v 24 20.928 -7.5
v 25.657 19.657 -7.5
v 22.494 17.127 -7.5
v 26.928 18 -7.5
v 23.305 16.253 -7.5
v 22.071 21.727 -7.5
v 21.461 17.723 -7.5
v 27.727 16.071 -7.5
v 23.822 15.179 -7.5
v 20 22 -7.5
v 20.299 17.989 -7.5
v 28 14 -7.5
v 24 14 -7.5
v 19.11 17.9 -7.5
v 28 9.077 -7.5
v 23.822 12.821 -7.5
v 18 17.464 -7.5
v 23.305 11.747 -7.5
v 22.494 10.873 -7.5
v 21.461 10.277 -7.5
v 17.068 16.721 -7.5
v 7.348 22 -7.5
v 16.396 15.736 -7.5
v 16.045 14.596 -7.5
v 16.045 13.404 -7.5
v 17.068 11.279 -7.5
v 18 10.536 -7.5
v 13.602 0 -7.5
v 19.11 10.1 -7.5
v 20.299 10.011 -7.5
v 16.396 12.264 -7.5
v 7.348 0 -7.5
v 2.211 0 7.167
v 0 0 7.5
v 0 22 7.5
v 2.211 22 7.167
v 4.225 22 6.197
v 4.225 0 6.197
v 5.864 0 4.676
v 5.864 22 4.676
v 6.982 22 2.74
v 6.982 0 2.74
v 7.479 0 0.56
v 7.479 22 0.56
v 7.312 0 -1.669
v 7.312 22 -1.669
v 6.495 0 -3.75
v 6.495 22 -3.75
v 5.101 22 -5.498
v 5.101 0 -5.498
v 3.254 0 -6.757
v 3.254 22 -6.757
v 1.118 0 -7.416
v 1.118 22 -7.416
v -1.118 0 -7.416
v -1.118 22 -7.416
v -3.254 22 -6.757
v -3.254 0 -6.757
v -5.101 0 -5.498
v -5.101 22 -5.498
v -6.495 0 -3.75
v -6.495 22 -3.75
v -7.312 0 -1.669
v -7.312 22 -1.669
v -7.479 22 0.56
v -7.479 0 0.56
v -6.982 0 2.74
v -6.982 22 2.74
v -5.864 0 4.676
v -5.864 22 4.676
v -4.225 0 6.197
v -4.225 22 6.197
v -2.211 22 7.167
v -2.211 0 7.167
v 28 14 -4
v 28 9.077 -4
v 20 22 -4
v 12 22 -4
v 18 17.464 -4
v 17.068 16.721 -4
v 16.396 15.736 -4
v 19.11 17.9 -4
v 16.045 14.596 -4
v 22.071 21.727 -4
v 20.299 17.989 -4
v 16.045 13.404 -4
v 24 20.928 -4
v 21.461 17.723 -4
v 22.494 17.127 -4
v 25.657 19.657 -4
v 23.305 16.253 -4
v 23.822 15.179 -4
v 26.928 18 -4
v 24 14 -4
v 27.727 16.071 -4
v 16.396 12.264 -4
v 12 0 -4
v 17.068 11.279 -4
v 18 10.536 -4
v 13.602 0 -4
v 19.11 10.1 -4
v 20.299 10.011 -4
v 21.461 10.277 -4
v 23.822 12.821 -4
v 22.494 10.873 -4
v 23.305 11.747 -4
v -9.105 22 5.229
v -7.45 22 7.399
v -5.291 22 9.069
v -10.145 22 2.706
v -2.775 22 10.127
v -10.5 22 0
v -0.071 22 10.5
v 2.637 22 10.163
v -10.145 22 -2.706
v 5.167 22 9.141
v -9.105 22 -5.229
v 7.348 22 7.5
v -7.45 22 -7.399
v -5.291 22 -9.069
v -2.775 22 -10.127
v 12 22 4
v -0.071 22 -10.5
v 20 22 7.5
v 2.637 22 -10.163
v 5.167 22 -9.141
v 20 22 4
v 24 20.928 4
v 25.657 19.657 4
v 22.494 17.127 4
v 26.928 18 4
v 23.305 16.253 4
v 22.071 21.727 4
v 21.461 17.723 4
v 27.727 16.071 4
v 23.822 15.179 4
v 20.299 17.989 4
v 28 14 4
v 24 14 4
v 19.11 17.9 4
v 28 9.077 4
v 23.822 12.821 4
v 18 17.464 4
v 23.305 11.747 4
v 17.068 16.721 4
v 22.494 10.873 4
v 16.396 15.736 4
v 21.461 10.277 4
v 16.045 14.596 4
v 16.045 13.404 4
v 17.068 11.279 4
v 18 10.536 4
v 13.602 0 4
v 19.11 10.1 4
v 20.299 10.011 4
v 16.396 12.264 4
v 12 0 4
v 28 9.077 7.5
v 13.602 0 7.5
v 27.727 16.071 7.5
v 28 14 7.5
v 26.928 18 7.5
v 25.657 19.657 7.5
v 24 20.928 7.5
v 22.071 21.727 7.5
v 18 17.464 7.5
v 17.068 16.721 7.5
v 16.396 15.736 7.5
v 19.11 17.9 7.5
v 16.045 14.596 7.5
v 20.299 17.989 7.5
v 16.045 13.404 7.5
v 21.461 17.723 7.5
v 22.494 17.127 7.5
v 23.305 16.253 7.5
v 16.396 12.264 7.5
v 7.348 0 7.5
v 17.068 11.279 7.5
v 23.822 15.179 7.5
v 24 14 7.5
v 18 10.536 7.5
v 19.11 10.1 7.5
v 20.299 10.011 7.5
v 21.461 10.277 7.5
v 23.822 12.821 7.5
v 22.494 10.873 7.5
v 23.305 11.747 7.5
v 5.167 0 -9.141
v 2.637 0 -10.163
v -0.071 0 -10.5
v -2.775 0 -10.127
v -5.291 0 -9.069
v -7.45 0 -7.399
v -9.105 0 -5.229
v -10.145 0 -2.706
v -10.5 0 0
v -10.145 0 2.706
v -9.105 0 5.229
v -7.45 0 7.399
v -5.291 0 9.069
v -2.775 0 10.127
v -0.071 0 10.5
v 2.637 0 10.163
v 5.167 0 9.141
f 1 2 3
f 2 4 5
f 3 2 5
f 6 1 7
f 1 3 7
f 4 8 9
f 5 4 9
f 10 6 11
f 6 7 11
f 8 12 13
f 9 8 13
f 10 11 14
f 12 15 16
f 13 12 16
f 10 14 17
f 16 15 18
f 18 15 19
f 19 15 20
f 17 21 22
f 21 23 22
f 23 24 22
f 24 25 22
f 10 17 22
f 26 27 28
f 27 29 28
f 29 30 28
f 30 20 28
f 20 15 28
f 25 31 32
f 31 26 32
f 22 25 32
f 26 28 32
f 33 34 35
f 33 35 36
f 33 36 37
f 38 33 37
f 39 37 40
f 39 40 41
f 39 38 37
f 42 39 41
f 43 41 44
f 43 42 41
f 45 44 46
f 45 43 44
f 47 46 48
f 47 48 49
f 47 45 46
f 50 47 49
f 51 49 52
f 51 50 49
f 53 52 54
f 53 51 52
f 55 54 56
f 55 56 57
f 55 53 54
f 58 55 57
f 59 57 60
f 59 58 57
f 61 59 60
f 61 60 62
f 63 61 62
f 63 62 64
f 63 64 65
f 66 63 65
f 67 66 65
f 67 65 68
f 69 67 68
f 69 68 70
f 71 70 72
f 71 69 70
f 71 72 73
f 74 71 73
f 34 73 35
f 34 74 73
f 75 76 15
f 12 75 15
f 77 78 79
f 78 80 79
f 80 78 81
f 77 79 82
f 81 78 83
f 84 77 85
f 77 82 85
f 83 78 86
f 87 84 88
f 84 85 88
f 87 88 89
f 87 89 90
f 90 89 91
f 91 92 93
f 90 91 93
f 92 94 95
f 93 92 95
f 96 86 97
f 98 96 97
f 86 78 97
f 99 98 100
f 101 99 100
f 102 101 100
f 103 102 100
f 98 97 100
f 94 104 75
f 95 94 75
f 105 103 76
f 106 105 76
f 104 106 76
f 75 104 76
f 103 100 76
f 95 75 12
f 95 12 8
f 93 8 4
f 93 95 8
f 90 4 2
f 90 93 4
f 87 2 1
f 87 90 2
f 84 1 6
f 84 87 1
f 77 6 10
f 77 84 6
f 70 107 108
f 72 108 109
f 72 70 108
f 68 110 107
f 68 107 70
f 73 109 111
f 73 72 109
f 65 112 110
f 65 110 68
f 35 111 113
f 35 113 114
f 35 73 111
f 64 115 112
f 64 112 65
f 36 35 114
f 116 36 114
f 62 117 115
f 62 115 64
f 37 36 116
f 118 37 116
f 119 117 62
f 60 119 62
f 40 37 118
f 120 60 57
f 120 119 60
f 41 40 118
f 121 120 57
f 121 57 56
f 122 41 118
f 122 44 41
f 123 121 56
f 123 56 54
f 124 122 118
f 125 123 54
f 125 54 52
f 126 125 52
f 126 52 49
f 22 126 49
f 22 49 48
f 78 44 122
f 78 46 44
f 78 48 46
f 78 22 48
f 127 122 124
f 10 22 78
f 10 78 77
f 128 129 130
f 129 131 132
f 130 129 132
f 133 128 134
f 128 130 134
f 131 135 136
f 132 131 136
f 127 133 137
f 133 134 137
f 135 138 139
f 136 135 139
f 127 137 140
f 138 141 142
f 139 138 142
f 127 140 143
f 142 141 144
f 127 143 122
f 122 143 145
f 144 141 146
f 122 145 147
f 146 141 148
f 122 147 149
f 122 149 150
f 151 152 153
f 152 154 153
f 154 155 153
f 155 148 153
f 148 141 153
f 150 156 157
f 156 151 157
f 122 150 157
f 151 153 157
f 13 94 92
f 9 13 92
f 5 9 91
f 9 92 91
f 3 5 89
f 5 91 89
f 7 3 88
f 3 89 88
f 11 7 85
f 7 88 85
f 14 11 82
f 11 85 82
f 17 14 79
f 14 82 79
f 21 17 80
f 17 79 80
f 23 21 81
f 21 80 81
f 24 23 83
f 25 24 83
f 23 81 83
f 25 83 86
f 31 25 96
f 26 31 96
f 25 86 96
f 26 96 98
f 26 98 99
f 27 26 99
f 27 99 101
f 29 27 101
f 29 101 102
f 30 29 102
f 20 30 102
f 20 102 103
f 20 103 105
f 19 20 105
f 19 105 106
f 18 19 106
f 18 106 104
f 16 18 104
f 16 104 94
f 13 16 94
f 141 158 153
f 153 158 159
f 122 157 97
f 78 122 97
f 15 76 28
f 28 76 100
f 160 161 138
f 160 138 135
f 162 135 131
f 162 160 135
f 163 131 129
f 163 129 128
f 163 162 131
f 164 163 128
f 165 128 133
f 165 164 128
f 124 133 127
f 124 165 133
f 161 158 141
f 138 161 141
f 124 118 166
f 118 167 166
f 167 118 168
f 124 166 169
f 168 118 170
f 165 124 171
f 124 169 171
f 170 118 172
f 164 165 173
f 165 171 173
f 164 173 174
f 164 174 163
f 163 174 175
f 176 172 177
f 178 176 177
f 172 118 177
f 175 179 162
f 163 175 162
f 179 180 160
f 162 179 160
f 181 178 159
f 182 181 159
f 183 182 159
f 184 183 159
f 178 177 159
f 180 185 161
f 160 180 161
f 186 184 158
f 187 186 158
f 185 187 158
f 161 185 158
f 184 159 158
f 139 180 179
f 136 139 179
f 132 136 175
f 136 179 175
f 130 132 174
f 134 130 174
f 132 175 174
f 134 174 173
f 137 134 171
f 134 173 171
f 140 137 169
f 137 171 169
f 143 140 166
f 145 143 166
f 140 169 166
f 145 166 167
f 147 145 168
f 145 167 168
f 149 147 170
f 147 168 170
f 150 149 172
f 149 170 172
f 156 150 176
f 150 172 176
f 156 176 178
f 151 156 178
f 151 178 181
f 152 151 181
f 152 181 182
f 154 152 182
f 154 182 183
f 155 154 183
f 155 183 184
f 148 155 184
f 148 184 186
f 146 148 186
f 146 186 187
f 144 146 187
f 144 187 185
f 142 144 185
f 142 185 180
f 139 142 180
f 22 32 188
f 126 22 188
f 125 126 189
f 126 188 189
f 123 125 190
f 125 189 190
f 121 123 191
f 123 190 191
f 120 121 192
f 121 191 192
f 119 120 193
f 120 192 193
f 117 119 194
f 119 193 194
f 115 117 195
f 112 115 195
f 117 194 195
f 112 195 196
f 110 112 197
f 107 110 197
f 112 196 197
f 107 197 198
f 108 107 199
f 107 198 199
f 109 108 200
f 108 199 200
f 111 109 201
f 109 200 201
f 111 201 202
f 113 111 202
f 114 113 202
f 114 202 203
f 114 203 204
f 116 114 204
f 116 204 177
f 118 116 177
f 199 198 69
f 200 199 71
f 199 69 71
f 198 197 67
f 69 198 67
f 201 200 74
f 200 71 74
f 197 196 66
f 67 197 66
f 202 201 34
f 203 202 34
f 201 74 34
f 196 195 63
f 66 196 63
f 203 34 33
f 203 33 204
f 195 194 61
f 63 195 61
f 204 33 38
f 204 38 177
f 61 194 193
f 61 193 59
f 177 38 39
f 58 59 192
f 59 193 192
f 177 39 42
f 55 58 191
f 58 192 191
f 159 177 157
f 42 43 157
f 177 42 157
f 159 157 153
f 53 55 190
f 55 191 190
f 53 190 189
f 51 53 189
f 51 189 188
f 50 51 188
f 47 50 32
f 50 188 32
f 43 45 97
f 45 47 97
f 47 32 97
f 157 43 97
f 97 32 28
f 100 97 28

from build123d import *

# Parameters (mm, degrees)
SKETCH1_R           = 7.5
BOSS_EXTRUDE1_DEPTH = 22
CUT_EXTRUDE1_REACH  = 41.9
SKETCH2_R           = 4


with BuildPart() as part:
    # Sketch1 → Boss-Extrude1 (new body)
    with BuildSketch(Plane(origin=(0, 0, 0), x_dir=(1, 0, 0), z_dir=(0, 1, 0))):
        with BuildLine():
            Line((28, 7.5), (7.348469228, 7.5))
            ThreePointArc((7.348469228, 7.5), (-10.5, 0), (7.348469228, -7.5))
            Line((7.348469228, -7.5), (28, -7.5))
            Line((28, -7.5), (28, -4))
            Line((28, -4), (12, -4))
            Line((12, -4), (12, 4))
            Line((12, 4), (28, 4))
            Line((28, 4), (28, 7.5))
        make_face()
        with Locations(Location((0, 0, 0), (0, 0, 270))):
            Circle(SKETCH1_R, mode=Mode.SUBTRACT)
    extrude(amount=BOSS_EXTRUDE1_DEPTH)

    # Cut-Extrude1: up to this face of the body (flat: up to its plane)
    cut_extrude1_end = Plane(part.part.faces().sort_by_distance((17.674234614, 11, -7.5))[0])
    # Sketch2 → Cut-Extrude1 (cut, up to the picked face)
    with BuildSketch(Plane.XY.offset(7.5), mode=Mode.PRIVATE) as cut_extrude1_sk1:
        with Locations((20, 14)):
            Circle(SKETCH2_R)
    cut_extrude1_tool1 = split(extrude(cut_extrude1_sk1.sketch, amount=-CUT_EXTRUDE1_REACH, mode=Mode.PRIVATE), bisect_by=cut_extrude1_end, keep=Keep.BOTH, mode=Mode.PRIVATE)
    # Sketch2 → Cut-Extrude1 (cut, up to the picked face)
    with BuildSketch(Plane.XY.offset(7.5), mode=Mode.PRIVATE) as cut_extrude1_sk2:
        Polygon((28, 9.077491087), (13.602007738, 0), (28, 0), align=None)
    cut_extrude1_tool2 = split(extrude(cut_extrude1_sk2.sketch, amount=-CUT_EXTRUDE1_REACH, mode=Mode.PRIVATE), bisect_by=cut_extrude1_end, keep=Keep.BOTH, mode=Mode.PRIVATE)
    # Sketch2 → Cut-Extrude1 (cut, up to the picked face)
    with BuildSketch(Plane.XY.offset(7.5), mode=Mode.PRIVATE) as cut_extrude1_sk3:
        with BuildLine():
            Line((20, 22), (20, 25.764527095))
            Line((20, 25.764527095), (29.423240249, 25.764527095))
            Line((29.423240249, 25.764527095), (29.423240249, 14))
            Line((29.423240249, 14), (28, 14))
            ThreePointArc((28, 14), (25.656854249, 19.656854249), (20, 22))
        make_face()
    cut_extrude1_tool3 = split(extrude(cut_extrude1_sk3.sketch, amount=-CUT_EXTRUDE1_REACH, mode=Mode.PRIVATE), bisect_by=cut_extrude1_end, keep=Keep.BOTH, mode=Mode.PRIVATE)
    add(cut_extrude1_tool1.solids().sort_by(Axis((20, 14, 7.5), (0, 0, -1)))[0], mode=Mode.SUBTRACT)
    add(cut_extrude1_tool2.solids().sort_by(Axis((23.200669, 3.02583, 7.5), (0, 0, -1)))[0], mode=Mode.SUBTRACT)
    add(cut_extrude1_tool3.solids().sort_by(Axis((25.803554, 21.945292, 7.5), (0, 0, -1)))[0], mode=Mode.SUBTRACT)


solid = part.part
